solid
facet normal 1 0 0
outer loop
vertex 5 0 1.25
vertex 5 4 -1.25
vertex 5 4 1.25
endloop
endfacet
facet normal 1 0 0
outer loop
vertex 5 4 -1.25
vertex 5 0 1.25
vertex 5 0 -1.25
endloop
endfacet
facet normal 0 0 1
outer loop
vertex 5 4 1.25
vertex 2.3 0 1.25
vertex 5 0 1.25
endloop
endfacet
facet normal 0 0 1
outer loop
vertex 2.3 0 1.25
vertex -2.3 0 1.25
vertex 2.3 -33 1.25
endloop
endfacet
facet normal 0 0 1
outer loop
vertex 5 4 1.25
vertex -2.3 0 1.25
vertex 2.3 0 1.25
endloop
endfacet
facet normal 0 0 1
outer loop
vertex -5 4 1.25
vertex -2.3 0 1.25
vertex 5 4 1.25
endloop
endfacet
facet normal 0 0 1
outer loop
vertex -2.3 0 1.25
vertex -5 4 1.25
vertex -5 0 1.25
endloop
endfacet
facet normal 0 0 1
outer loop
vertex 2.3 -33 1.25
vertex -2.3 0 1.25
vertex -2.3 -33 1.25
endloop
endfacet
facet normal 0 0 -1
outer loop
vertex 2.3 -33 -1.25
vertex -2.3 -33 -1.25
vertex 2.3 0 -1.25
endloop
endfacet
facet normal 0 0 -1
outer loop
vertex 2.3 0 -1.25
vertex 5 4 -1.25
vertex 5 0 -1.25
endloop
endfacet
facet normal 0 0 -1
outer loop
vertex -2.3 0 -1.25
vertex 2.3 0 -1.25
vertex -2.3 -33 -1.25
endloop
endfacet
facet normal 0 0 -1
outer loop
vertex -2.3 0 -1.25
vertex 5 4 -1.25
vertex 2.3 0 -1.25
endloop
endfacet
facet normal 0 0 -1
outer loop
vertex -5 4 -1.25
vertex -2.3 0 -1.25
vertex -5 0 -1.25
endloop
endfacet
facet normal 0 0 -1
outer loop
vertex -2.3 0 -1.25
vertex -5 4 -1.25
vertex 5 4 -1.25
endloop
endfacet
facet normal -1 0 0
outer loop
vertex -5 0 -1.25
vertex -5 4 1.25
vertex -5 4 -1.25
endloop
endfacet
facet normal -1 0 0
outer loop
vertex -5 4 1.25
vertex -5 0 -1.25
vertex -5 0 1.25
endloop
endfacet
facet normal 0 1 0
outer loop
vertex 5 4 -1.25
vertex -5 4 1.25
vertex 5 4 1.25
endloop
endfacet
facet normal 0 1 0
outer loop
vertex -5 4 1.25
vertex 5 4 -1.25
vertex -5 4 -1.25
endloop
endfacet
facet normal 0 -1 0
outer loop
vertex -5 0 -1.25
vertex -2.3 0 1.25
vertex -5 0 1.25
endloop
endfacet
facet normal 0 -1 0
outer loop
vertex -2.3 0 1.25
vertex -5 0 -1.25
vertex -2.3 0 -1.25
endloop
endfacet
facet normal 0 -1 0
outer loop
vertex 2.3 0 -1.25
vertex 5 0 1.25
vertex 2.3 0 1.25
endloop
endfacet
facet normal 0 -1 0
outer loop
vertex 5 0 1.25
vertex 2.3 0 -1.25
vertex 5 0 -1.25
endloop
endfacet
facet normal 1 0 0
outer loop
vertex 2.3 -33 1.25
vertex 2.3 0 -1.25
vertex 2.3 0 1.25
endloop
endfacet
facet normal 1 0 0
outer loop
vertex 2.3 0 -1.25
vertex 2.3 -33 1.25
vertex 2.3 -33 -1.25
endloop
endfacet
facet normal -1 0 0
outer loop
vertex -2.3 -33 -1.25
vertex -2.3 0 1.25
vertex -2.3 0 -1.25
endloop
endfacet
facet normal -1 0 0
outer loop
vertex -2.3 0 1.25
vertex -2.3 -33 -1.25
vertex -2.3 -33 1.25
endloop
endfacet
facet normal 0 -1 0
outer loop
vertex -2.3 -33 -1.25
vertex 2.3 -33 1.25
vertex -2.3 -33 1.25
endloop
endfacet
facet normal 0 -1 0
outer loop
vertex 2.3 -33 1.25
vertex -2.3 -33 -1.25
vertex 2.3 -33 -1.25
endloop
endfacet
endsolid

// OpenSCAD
module aa(){
difference(){
    union(){
    translate([0,8,0])cylinder(2.5,r=8,center=true,$fn=50);
    translate([3,2,0])cube([6,4,2.5],center=true);
    }
    translate([0,8,0])cylinder(3,r=3,center=true,$fn=50);
    translate([-4,4,0])cube([8,8,3],center=true);
}
translate([0,-3,0])cube([13,6,2.5],center=true);
translate([0,-3-26/2,0])cube([7,26,2.5],center=true);
}

module bb(){
difference(){
    translate([0,12.5,0])cylinder(2.5,r=13,center=true,$fn=50);
}
translate([0,-26/2,0])cube([7,26,2.5],center=true);
}

module cc(){
translate([0, 4/2,0])cube([10,4,2.5],center=true);
translate([0,-33/2,0])cube([4.6,33,2.5],center=true);
}

/*
aa();
translate([12,13,0])bb();
*/
cc();
